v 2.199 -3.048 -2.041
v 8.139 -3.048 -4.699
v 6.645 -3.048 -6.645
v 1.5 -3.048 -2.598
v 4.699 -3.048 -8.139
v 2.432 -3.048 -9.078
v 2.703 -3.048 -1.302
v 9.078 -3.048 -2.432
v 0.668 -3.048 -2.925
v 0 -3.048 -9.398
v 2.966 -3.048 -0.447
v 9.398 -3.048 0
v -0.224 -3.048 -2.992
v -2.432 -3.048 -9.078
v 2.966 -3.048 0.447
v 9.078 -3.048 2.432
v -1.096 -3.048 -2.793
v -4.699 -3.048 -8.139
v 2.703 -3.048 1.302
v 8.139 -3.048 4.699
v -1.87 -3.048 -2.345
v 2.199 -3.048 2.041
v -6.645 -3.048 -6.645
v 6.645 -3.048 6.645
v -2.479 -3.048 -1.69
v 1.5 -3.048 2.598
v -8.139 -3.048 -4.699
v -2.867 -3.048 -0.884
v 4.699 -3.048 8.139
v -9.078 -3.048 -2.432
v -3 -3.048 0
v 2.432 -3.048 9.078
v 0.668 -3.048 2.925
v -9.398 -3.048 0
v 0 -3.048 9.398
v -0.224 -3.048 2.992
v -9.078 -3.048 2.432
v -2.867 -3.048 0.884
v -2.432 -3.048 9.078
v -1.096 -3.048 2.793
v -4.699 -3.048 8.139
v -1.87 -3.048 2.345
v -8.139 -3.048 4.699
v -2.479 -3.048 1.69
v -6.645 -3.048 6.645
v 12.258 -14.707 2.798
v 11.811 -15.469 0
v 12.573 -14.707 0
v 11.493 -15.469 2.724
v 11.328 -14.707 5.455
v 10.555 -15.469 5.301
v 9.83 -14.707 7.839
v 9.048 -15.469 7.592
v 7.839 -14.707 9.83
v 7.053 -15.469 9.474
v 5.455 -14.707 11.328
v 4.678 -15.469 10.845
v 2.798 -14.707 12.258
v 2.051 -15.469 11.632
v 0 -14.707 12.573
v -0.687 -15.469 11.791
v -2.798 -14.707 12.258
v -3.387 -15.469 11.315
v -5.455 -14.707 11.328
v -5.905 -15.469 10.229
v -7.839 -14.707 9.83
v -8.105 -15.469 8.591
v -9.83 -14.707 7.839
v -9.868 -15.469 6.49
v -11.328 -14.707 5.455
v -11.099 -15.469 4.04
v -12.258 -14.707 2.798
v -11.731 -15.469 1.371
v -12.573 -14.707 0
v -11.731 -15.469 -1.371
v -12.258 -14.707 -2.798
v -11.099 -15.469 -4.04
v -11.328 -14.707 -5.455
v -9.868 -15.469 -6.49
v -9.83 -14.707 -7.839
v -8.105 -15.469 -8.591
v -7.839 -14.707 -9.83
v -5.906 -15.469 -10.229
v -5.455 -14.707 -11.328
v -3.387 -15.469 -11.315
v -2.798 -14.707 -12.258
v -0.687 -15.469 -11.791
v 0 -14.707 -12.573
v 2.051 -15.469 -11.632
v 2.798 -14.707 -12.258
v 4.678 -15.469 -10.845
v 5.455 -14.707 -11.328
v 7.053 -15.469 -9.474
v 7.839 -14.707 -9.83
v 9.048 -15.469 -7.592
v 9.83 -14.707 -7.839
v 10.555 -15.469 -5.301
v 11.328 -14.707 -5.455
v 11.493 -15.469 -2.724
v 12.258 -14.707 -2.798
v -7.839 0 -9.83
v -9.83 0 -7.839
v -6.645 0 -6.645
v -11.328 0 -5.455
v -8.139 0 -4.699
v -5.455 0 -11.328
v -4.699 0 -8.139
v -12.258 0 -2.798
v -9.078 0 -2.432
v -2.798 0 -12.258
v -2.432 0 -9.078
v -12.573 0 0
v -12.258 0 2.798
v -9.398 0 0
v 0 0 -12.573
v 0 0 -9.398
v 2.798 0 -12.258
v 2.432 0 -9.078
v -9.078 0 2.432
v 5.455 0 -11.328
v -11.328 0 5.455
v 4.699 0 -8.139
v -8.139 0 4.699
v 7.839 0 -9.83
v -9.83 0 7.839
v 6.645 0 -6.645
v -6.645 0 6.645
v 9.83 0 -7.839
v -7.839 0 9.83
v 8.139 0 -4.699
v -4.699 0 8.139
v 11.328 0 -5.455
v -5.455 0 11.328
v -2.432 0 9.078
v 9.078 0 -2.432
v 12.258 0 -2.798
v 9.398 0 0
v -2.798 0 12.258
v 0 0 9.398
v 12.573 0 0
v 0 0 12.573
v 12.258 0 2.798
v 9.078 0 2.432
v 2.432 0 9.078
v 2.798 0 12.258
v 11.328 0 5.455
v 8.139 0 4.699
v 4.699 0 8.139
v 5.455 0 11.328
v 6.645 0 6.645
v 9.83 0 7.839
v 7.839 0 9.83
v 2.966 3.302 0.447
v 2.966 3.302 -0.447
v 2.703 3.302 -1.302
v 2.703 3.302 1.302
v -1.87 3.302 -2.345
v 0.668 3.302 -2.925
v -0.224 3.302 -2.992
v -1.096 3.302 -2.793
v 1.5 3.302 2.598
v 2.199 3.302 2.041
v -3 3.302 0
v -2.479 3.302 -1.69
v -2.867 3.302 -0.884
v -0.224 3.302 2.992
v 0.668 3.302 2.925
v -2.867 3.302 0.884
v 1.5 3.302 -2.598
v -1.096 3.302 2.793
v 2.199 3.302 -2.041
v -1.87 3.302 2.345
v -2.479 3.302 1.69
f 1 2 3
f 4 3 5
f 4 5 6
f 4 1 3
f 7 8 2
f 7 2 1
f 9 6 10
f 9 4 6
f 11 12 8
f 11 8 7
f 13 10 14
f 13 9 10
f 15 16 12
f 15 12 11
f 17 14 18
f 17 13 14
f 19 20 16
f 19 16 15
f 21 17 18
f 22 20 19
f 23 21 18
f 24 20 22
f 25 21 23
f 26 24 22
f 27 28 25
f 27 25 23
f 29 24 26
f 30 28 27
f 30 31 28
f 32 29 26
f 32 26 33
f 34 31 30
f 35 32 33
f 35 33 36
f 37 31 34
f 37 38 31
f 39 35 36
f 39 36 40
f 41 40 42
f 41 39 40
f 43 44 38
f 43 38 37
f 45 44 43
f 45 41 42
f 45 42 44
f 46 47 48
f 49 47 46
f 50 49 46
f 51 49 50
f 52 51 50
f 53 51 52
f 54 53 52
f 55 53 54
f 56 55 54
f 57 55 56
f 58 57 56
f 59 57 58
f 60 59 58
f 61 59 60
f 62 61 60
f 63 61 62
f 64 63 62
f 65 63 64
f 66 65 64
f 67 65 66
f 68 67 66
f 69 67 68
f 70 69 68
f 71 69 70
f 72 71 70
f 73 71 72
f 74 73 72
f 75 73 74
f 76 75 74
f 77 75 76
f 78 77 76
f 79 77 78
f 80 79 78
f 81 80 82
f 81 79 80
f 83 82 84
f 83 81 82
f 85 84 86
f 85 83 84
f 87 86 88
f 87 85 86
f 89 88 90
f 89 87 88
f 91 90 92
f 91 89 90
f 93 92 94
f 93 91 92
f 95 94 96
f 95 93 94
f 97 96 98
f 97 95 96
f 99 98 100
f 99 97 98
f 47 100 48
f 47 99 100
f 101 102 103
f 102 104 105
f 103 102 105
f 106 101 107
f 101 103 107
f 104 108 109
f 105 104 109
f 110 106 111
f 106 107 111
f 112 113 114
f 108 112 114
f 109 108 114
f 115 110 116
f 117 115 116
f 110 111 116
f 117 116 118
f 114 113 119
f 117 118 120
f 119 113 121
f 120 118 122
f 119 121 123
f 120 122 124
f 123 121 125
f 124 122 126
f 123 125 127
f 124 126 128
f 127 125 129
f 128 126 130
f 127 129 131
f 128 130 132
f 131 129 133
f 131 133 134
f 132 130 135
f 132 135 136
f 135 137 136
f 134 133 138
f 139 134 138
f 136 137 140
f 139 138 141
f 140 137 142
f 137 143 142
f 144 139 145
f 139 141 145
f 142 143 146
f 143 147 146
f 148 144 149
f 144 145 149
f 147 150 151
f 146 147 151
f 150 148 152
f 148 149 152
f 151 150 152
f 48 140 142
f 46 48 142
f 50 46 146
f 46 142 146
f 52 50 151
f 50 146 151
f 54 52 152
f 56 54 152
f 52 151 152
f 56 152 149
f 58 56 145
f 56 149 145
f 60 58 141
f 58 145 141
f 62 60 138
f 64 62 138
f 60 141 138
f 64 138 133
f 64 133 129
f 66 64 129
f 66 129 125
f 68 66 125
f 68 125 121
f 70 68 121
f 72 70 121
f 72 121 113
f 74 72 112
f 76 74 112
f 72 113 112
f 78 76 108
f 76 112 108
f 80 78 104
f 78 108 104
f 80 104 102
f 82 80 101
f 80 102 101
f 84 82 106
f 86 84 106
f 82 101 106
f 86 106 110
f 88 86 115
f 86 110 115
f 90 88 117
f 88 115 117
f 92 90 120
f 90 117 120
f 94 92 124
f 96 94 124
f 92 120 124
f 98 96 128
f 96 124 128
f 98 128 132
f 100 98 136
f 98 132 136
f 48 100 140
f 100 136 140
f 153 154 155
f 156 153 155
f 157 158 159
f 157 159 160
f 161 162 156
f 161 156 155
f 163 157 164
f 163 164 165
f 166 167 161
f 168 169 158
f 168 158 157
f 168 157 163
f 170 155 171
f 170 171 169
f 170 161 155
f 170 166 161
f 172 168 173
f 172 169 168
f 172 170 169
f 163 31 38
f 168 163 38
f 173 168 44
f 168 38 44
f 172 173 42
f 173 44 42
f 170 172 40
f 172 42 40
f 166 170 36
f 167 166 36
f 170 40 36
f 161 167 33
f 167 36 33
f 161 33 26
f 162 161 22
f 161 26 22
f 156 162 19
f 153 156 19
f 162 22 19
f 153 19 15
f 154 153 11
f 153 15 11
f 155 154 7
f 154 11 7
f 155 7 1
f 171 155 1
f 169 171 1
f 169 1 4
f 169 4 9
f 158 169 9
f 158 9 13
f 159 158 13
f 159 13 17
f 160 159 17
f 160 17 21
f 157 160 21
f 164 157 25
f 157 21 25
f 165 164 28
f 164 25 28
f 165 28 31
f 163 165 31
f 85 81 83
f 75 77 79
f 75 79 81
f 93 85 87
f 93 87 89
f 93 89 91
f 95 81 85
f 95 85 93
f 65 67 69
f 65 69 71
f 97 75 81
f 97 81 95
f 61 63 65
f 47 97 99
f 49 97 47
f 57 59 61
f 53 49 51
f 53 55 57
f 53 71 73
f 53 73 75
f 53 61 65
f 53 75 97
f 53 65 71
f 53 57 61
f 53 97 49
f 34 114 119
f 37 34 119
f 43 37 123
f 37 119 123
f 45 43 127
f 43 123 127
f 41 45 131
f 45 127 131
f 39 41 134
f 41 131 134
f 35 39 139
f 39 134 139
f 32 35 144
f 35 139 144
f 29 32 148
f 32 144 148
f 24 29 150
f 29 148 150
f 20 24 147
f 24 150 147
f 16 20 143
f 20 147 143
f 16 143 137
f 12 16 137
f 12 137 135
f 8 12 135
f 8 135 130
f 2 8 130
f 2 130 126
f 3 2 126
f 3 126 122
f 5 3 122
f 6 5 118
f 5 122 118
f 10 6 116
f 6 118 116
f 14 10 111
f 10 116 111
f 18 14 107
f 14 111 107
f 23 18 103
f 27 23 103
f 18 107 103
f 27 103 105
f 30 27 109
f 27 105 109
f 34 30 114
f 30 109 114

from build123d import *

# Parameters (mm, degrees)
F0_R     = 12.573
F1_DEPTH = 15.4686
F2_R     = 9.398
F3_DEPTH = 3.048
F4_SIZE  = 0.762
F5_R     = 3
F6_DEPTH = 6.35


with BuildPart() as f1:
    # F0 (on Front) → F1 (new body)
    with BuildSketch(Plane.XZ):
        Circle(F0_R)
    extrude(amount=F1_DEPTH)

    # F2 (on face) → F3 (cut)
    with BuildSketch(Plane(origin=(0, 0, 0), x_dir=(-1, 0, 0), z_dir=(0, 1, 0))):
        Circle(F2_R)
    extrude(amount=-F3_DEPTH, mode=Mode.SUBTRACT)

    # F4
    f4_edges = [f1.edges().sort_by_distance(p)[0] for p in [
        (-12.573, -15.4686, 0),
    ]]
    chamfer(f4_edges, length=F4_SIZE)

    # F5 (on face) → F6 (join)
    with BuildSketch(Plane(origin=(0, -3.048, 0), x_dir=(-1, 0, 0), z_dir=(0, 1, 0))):
        Circle(F5_R)
    extrude(amount=F6_DEPTH)


solid = f1.part
